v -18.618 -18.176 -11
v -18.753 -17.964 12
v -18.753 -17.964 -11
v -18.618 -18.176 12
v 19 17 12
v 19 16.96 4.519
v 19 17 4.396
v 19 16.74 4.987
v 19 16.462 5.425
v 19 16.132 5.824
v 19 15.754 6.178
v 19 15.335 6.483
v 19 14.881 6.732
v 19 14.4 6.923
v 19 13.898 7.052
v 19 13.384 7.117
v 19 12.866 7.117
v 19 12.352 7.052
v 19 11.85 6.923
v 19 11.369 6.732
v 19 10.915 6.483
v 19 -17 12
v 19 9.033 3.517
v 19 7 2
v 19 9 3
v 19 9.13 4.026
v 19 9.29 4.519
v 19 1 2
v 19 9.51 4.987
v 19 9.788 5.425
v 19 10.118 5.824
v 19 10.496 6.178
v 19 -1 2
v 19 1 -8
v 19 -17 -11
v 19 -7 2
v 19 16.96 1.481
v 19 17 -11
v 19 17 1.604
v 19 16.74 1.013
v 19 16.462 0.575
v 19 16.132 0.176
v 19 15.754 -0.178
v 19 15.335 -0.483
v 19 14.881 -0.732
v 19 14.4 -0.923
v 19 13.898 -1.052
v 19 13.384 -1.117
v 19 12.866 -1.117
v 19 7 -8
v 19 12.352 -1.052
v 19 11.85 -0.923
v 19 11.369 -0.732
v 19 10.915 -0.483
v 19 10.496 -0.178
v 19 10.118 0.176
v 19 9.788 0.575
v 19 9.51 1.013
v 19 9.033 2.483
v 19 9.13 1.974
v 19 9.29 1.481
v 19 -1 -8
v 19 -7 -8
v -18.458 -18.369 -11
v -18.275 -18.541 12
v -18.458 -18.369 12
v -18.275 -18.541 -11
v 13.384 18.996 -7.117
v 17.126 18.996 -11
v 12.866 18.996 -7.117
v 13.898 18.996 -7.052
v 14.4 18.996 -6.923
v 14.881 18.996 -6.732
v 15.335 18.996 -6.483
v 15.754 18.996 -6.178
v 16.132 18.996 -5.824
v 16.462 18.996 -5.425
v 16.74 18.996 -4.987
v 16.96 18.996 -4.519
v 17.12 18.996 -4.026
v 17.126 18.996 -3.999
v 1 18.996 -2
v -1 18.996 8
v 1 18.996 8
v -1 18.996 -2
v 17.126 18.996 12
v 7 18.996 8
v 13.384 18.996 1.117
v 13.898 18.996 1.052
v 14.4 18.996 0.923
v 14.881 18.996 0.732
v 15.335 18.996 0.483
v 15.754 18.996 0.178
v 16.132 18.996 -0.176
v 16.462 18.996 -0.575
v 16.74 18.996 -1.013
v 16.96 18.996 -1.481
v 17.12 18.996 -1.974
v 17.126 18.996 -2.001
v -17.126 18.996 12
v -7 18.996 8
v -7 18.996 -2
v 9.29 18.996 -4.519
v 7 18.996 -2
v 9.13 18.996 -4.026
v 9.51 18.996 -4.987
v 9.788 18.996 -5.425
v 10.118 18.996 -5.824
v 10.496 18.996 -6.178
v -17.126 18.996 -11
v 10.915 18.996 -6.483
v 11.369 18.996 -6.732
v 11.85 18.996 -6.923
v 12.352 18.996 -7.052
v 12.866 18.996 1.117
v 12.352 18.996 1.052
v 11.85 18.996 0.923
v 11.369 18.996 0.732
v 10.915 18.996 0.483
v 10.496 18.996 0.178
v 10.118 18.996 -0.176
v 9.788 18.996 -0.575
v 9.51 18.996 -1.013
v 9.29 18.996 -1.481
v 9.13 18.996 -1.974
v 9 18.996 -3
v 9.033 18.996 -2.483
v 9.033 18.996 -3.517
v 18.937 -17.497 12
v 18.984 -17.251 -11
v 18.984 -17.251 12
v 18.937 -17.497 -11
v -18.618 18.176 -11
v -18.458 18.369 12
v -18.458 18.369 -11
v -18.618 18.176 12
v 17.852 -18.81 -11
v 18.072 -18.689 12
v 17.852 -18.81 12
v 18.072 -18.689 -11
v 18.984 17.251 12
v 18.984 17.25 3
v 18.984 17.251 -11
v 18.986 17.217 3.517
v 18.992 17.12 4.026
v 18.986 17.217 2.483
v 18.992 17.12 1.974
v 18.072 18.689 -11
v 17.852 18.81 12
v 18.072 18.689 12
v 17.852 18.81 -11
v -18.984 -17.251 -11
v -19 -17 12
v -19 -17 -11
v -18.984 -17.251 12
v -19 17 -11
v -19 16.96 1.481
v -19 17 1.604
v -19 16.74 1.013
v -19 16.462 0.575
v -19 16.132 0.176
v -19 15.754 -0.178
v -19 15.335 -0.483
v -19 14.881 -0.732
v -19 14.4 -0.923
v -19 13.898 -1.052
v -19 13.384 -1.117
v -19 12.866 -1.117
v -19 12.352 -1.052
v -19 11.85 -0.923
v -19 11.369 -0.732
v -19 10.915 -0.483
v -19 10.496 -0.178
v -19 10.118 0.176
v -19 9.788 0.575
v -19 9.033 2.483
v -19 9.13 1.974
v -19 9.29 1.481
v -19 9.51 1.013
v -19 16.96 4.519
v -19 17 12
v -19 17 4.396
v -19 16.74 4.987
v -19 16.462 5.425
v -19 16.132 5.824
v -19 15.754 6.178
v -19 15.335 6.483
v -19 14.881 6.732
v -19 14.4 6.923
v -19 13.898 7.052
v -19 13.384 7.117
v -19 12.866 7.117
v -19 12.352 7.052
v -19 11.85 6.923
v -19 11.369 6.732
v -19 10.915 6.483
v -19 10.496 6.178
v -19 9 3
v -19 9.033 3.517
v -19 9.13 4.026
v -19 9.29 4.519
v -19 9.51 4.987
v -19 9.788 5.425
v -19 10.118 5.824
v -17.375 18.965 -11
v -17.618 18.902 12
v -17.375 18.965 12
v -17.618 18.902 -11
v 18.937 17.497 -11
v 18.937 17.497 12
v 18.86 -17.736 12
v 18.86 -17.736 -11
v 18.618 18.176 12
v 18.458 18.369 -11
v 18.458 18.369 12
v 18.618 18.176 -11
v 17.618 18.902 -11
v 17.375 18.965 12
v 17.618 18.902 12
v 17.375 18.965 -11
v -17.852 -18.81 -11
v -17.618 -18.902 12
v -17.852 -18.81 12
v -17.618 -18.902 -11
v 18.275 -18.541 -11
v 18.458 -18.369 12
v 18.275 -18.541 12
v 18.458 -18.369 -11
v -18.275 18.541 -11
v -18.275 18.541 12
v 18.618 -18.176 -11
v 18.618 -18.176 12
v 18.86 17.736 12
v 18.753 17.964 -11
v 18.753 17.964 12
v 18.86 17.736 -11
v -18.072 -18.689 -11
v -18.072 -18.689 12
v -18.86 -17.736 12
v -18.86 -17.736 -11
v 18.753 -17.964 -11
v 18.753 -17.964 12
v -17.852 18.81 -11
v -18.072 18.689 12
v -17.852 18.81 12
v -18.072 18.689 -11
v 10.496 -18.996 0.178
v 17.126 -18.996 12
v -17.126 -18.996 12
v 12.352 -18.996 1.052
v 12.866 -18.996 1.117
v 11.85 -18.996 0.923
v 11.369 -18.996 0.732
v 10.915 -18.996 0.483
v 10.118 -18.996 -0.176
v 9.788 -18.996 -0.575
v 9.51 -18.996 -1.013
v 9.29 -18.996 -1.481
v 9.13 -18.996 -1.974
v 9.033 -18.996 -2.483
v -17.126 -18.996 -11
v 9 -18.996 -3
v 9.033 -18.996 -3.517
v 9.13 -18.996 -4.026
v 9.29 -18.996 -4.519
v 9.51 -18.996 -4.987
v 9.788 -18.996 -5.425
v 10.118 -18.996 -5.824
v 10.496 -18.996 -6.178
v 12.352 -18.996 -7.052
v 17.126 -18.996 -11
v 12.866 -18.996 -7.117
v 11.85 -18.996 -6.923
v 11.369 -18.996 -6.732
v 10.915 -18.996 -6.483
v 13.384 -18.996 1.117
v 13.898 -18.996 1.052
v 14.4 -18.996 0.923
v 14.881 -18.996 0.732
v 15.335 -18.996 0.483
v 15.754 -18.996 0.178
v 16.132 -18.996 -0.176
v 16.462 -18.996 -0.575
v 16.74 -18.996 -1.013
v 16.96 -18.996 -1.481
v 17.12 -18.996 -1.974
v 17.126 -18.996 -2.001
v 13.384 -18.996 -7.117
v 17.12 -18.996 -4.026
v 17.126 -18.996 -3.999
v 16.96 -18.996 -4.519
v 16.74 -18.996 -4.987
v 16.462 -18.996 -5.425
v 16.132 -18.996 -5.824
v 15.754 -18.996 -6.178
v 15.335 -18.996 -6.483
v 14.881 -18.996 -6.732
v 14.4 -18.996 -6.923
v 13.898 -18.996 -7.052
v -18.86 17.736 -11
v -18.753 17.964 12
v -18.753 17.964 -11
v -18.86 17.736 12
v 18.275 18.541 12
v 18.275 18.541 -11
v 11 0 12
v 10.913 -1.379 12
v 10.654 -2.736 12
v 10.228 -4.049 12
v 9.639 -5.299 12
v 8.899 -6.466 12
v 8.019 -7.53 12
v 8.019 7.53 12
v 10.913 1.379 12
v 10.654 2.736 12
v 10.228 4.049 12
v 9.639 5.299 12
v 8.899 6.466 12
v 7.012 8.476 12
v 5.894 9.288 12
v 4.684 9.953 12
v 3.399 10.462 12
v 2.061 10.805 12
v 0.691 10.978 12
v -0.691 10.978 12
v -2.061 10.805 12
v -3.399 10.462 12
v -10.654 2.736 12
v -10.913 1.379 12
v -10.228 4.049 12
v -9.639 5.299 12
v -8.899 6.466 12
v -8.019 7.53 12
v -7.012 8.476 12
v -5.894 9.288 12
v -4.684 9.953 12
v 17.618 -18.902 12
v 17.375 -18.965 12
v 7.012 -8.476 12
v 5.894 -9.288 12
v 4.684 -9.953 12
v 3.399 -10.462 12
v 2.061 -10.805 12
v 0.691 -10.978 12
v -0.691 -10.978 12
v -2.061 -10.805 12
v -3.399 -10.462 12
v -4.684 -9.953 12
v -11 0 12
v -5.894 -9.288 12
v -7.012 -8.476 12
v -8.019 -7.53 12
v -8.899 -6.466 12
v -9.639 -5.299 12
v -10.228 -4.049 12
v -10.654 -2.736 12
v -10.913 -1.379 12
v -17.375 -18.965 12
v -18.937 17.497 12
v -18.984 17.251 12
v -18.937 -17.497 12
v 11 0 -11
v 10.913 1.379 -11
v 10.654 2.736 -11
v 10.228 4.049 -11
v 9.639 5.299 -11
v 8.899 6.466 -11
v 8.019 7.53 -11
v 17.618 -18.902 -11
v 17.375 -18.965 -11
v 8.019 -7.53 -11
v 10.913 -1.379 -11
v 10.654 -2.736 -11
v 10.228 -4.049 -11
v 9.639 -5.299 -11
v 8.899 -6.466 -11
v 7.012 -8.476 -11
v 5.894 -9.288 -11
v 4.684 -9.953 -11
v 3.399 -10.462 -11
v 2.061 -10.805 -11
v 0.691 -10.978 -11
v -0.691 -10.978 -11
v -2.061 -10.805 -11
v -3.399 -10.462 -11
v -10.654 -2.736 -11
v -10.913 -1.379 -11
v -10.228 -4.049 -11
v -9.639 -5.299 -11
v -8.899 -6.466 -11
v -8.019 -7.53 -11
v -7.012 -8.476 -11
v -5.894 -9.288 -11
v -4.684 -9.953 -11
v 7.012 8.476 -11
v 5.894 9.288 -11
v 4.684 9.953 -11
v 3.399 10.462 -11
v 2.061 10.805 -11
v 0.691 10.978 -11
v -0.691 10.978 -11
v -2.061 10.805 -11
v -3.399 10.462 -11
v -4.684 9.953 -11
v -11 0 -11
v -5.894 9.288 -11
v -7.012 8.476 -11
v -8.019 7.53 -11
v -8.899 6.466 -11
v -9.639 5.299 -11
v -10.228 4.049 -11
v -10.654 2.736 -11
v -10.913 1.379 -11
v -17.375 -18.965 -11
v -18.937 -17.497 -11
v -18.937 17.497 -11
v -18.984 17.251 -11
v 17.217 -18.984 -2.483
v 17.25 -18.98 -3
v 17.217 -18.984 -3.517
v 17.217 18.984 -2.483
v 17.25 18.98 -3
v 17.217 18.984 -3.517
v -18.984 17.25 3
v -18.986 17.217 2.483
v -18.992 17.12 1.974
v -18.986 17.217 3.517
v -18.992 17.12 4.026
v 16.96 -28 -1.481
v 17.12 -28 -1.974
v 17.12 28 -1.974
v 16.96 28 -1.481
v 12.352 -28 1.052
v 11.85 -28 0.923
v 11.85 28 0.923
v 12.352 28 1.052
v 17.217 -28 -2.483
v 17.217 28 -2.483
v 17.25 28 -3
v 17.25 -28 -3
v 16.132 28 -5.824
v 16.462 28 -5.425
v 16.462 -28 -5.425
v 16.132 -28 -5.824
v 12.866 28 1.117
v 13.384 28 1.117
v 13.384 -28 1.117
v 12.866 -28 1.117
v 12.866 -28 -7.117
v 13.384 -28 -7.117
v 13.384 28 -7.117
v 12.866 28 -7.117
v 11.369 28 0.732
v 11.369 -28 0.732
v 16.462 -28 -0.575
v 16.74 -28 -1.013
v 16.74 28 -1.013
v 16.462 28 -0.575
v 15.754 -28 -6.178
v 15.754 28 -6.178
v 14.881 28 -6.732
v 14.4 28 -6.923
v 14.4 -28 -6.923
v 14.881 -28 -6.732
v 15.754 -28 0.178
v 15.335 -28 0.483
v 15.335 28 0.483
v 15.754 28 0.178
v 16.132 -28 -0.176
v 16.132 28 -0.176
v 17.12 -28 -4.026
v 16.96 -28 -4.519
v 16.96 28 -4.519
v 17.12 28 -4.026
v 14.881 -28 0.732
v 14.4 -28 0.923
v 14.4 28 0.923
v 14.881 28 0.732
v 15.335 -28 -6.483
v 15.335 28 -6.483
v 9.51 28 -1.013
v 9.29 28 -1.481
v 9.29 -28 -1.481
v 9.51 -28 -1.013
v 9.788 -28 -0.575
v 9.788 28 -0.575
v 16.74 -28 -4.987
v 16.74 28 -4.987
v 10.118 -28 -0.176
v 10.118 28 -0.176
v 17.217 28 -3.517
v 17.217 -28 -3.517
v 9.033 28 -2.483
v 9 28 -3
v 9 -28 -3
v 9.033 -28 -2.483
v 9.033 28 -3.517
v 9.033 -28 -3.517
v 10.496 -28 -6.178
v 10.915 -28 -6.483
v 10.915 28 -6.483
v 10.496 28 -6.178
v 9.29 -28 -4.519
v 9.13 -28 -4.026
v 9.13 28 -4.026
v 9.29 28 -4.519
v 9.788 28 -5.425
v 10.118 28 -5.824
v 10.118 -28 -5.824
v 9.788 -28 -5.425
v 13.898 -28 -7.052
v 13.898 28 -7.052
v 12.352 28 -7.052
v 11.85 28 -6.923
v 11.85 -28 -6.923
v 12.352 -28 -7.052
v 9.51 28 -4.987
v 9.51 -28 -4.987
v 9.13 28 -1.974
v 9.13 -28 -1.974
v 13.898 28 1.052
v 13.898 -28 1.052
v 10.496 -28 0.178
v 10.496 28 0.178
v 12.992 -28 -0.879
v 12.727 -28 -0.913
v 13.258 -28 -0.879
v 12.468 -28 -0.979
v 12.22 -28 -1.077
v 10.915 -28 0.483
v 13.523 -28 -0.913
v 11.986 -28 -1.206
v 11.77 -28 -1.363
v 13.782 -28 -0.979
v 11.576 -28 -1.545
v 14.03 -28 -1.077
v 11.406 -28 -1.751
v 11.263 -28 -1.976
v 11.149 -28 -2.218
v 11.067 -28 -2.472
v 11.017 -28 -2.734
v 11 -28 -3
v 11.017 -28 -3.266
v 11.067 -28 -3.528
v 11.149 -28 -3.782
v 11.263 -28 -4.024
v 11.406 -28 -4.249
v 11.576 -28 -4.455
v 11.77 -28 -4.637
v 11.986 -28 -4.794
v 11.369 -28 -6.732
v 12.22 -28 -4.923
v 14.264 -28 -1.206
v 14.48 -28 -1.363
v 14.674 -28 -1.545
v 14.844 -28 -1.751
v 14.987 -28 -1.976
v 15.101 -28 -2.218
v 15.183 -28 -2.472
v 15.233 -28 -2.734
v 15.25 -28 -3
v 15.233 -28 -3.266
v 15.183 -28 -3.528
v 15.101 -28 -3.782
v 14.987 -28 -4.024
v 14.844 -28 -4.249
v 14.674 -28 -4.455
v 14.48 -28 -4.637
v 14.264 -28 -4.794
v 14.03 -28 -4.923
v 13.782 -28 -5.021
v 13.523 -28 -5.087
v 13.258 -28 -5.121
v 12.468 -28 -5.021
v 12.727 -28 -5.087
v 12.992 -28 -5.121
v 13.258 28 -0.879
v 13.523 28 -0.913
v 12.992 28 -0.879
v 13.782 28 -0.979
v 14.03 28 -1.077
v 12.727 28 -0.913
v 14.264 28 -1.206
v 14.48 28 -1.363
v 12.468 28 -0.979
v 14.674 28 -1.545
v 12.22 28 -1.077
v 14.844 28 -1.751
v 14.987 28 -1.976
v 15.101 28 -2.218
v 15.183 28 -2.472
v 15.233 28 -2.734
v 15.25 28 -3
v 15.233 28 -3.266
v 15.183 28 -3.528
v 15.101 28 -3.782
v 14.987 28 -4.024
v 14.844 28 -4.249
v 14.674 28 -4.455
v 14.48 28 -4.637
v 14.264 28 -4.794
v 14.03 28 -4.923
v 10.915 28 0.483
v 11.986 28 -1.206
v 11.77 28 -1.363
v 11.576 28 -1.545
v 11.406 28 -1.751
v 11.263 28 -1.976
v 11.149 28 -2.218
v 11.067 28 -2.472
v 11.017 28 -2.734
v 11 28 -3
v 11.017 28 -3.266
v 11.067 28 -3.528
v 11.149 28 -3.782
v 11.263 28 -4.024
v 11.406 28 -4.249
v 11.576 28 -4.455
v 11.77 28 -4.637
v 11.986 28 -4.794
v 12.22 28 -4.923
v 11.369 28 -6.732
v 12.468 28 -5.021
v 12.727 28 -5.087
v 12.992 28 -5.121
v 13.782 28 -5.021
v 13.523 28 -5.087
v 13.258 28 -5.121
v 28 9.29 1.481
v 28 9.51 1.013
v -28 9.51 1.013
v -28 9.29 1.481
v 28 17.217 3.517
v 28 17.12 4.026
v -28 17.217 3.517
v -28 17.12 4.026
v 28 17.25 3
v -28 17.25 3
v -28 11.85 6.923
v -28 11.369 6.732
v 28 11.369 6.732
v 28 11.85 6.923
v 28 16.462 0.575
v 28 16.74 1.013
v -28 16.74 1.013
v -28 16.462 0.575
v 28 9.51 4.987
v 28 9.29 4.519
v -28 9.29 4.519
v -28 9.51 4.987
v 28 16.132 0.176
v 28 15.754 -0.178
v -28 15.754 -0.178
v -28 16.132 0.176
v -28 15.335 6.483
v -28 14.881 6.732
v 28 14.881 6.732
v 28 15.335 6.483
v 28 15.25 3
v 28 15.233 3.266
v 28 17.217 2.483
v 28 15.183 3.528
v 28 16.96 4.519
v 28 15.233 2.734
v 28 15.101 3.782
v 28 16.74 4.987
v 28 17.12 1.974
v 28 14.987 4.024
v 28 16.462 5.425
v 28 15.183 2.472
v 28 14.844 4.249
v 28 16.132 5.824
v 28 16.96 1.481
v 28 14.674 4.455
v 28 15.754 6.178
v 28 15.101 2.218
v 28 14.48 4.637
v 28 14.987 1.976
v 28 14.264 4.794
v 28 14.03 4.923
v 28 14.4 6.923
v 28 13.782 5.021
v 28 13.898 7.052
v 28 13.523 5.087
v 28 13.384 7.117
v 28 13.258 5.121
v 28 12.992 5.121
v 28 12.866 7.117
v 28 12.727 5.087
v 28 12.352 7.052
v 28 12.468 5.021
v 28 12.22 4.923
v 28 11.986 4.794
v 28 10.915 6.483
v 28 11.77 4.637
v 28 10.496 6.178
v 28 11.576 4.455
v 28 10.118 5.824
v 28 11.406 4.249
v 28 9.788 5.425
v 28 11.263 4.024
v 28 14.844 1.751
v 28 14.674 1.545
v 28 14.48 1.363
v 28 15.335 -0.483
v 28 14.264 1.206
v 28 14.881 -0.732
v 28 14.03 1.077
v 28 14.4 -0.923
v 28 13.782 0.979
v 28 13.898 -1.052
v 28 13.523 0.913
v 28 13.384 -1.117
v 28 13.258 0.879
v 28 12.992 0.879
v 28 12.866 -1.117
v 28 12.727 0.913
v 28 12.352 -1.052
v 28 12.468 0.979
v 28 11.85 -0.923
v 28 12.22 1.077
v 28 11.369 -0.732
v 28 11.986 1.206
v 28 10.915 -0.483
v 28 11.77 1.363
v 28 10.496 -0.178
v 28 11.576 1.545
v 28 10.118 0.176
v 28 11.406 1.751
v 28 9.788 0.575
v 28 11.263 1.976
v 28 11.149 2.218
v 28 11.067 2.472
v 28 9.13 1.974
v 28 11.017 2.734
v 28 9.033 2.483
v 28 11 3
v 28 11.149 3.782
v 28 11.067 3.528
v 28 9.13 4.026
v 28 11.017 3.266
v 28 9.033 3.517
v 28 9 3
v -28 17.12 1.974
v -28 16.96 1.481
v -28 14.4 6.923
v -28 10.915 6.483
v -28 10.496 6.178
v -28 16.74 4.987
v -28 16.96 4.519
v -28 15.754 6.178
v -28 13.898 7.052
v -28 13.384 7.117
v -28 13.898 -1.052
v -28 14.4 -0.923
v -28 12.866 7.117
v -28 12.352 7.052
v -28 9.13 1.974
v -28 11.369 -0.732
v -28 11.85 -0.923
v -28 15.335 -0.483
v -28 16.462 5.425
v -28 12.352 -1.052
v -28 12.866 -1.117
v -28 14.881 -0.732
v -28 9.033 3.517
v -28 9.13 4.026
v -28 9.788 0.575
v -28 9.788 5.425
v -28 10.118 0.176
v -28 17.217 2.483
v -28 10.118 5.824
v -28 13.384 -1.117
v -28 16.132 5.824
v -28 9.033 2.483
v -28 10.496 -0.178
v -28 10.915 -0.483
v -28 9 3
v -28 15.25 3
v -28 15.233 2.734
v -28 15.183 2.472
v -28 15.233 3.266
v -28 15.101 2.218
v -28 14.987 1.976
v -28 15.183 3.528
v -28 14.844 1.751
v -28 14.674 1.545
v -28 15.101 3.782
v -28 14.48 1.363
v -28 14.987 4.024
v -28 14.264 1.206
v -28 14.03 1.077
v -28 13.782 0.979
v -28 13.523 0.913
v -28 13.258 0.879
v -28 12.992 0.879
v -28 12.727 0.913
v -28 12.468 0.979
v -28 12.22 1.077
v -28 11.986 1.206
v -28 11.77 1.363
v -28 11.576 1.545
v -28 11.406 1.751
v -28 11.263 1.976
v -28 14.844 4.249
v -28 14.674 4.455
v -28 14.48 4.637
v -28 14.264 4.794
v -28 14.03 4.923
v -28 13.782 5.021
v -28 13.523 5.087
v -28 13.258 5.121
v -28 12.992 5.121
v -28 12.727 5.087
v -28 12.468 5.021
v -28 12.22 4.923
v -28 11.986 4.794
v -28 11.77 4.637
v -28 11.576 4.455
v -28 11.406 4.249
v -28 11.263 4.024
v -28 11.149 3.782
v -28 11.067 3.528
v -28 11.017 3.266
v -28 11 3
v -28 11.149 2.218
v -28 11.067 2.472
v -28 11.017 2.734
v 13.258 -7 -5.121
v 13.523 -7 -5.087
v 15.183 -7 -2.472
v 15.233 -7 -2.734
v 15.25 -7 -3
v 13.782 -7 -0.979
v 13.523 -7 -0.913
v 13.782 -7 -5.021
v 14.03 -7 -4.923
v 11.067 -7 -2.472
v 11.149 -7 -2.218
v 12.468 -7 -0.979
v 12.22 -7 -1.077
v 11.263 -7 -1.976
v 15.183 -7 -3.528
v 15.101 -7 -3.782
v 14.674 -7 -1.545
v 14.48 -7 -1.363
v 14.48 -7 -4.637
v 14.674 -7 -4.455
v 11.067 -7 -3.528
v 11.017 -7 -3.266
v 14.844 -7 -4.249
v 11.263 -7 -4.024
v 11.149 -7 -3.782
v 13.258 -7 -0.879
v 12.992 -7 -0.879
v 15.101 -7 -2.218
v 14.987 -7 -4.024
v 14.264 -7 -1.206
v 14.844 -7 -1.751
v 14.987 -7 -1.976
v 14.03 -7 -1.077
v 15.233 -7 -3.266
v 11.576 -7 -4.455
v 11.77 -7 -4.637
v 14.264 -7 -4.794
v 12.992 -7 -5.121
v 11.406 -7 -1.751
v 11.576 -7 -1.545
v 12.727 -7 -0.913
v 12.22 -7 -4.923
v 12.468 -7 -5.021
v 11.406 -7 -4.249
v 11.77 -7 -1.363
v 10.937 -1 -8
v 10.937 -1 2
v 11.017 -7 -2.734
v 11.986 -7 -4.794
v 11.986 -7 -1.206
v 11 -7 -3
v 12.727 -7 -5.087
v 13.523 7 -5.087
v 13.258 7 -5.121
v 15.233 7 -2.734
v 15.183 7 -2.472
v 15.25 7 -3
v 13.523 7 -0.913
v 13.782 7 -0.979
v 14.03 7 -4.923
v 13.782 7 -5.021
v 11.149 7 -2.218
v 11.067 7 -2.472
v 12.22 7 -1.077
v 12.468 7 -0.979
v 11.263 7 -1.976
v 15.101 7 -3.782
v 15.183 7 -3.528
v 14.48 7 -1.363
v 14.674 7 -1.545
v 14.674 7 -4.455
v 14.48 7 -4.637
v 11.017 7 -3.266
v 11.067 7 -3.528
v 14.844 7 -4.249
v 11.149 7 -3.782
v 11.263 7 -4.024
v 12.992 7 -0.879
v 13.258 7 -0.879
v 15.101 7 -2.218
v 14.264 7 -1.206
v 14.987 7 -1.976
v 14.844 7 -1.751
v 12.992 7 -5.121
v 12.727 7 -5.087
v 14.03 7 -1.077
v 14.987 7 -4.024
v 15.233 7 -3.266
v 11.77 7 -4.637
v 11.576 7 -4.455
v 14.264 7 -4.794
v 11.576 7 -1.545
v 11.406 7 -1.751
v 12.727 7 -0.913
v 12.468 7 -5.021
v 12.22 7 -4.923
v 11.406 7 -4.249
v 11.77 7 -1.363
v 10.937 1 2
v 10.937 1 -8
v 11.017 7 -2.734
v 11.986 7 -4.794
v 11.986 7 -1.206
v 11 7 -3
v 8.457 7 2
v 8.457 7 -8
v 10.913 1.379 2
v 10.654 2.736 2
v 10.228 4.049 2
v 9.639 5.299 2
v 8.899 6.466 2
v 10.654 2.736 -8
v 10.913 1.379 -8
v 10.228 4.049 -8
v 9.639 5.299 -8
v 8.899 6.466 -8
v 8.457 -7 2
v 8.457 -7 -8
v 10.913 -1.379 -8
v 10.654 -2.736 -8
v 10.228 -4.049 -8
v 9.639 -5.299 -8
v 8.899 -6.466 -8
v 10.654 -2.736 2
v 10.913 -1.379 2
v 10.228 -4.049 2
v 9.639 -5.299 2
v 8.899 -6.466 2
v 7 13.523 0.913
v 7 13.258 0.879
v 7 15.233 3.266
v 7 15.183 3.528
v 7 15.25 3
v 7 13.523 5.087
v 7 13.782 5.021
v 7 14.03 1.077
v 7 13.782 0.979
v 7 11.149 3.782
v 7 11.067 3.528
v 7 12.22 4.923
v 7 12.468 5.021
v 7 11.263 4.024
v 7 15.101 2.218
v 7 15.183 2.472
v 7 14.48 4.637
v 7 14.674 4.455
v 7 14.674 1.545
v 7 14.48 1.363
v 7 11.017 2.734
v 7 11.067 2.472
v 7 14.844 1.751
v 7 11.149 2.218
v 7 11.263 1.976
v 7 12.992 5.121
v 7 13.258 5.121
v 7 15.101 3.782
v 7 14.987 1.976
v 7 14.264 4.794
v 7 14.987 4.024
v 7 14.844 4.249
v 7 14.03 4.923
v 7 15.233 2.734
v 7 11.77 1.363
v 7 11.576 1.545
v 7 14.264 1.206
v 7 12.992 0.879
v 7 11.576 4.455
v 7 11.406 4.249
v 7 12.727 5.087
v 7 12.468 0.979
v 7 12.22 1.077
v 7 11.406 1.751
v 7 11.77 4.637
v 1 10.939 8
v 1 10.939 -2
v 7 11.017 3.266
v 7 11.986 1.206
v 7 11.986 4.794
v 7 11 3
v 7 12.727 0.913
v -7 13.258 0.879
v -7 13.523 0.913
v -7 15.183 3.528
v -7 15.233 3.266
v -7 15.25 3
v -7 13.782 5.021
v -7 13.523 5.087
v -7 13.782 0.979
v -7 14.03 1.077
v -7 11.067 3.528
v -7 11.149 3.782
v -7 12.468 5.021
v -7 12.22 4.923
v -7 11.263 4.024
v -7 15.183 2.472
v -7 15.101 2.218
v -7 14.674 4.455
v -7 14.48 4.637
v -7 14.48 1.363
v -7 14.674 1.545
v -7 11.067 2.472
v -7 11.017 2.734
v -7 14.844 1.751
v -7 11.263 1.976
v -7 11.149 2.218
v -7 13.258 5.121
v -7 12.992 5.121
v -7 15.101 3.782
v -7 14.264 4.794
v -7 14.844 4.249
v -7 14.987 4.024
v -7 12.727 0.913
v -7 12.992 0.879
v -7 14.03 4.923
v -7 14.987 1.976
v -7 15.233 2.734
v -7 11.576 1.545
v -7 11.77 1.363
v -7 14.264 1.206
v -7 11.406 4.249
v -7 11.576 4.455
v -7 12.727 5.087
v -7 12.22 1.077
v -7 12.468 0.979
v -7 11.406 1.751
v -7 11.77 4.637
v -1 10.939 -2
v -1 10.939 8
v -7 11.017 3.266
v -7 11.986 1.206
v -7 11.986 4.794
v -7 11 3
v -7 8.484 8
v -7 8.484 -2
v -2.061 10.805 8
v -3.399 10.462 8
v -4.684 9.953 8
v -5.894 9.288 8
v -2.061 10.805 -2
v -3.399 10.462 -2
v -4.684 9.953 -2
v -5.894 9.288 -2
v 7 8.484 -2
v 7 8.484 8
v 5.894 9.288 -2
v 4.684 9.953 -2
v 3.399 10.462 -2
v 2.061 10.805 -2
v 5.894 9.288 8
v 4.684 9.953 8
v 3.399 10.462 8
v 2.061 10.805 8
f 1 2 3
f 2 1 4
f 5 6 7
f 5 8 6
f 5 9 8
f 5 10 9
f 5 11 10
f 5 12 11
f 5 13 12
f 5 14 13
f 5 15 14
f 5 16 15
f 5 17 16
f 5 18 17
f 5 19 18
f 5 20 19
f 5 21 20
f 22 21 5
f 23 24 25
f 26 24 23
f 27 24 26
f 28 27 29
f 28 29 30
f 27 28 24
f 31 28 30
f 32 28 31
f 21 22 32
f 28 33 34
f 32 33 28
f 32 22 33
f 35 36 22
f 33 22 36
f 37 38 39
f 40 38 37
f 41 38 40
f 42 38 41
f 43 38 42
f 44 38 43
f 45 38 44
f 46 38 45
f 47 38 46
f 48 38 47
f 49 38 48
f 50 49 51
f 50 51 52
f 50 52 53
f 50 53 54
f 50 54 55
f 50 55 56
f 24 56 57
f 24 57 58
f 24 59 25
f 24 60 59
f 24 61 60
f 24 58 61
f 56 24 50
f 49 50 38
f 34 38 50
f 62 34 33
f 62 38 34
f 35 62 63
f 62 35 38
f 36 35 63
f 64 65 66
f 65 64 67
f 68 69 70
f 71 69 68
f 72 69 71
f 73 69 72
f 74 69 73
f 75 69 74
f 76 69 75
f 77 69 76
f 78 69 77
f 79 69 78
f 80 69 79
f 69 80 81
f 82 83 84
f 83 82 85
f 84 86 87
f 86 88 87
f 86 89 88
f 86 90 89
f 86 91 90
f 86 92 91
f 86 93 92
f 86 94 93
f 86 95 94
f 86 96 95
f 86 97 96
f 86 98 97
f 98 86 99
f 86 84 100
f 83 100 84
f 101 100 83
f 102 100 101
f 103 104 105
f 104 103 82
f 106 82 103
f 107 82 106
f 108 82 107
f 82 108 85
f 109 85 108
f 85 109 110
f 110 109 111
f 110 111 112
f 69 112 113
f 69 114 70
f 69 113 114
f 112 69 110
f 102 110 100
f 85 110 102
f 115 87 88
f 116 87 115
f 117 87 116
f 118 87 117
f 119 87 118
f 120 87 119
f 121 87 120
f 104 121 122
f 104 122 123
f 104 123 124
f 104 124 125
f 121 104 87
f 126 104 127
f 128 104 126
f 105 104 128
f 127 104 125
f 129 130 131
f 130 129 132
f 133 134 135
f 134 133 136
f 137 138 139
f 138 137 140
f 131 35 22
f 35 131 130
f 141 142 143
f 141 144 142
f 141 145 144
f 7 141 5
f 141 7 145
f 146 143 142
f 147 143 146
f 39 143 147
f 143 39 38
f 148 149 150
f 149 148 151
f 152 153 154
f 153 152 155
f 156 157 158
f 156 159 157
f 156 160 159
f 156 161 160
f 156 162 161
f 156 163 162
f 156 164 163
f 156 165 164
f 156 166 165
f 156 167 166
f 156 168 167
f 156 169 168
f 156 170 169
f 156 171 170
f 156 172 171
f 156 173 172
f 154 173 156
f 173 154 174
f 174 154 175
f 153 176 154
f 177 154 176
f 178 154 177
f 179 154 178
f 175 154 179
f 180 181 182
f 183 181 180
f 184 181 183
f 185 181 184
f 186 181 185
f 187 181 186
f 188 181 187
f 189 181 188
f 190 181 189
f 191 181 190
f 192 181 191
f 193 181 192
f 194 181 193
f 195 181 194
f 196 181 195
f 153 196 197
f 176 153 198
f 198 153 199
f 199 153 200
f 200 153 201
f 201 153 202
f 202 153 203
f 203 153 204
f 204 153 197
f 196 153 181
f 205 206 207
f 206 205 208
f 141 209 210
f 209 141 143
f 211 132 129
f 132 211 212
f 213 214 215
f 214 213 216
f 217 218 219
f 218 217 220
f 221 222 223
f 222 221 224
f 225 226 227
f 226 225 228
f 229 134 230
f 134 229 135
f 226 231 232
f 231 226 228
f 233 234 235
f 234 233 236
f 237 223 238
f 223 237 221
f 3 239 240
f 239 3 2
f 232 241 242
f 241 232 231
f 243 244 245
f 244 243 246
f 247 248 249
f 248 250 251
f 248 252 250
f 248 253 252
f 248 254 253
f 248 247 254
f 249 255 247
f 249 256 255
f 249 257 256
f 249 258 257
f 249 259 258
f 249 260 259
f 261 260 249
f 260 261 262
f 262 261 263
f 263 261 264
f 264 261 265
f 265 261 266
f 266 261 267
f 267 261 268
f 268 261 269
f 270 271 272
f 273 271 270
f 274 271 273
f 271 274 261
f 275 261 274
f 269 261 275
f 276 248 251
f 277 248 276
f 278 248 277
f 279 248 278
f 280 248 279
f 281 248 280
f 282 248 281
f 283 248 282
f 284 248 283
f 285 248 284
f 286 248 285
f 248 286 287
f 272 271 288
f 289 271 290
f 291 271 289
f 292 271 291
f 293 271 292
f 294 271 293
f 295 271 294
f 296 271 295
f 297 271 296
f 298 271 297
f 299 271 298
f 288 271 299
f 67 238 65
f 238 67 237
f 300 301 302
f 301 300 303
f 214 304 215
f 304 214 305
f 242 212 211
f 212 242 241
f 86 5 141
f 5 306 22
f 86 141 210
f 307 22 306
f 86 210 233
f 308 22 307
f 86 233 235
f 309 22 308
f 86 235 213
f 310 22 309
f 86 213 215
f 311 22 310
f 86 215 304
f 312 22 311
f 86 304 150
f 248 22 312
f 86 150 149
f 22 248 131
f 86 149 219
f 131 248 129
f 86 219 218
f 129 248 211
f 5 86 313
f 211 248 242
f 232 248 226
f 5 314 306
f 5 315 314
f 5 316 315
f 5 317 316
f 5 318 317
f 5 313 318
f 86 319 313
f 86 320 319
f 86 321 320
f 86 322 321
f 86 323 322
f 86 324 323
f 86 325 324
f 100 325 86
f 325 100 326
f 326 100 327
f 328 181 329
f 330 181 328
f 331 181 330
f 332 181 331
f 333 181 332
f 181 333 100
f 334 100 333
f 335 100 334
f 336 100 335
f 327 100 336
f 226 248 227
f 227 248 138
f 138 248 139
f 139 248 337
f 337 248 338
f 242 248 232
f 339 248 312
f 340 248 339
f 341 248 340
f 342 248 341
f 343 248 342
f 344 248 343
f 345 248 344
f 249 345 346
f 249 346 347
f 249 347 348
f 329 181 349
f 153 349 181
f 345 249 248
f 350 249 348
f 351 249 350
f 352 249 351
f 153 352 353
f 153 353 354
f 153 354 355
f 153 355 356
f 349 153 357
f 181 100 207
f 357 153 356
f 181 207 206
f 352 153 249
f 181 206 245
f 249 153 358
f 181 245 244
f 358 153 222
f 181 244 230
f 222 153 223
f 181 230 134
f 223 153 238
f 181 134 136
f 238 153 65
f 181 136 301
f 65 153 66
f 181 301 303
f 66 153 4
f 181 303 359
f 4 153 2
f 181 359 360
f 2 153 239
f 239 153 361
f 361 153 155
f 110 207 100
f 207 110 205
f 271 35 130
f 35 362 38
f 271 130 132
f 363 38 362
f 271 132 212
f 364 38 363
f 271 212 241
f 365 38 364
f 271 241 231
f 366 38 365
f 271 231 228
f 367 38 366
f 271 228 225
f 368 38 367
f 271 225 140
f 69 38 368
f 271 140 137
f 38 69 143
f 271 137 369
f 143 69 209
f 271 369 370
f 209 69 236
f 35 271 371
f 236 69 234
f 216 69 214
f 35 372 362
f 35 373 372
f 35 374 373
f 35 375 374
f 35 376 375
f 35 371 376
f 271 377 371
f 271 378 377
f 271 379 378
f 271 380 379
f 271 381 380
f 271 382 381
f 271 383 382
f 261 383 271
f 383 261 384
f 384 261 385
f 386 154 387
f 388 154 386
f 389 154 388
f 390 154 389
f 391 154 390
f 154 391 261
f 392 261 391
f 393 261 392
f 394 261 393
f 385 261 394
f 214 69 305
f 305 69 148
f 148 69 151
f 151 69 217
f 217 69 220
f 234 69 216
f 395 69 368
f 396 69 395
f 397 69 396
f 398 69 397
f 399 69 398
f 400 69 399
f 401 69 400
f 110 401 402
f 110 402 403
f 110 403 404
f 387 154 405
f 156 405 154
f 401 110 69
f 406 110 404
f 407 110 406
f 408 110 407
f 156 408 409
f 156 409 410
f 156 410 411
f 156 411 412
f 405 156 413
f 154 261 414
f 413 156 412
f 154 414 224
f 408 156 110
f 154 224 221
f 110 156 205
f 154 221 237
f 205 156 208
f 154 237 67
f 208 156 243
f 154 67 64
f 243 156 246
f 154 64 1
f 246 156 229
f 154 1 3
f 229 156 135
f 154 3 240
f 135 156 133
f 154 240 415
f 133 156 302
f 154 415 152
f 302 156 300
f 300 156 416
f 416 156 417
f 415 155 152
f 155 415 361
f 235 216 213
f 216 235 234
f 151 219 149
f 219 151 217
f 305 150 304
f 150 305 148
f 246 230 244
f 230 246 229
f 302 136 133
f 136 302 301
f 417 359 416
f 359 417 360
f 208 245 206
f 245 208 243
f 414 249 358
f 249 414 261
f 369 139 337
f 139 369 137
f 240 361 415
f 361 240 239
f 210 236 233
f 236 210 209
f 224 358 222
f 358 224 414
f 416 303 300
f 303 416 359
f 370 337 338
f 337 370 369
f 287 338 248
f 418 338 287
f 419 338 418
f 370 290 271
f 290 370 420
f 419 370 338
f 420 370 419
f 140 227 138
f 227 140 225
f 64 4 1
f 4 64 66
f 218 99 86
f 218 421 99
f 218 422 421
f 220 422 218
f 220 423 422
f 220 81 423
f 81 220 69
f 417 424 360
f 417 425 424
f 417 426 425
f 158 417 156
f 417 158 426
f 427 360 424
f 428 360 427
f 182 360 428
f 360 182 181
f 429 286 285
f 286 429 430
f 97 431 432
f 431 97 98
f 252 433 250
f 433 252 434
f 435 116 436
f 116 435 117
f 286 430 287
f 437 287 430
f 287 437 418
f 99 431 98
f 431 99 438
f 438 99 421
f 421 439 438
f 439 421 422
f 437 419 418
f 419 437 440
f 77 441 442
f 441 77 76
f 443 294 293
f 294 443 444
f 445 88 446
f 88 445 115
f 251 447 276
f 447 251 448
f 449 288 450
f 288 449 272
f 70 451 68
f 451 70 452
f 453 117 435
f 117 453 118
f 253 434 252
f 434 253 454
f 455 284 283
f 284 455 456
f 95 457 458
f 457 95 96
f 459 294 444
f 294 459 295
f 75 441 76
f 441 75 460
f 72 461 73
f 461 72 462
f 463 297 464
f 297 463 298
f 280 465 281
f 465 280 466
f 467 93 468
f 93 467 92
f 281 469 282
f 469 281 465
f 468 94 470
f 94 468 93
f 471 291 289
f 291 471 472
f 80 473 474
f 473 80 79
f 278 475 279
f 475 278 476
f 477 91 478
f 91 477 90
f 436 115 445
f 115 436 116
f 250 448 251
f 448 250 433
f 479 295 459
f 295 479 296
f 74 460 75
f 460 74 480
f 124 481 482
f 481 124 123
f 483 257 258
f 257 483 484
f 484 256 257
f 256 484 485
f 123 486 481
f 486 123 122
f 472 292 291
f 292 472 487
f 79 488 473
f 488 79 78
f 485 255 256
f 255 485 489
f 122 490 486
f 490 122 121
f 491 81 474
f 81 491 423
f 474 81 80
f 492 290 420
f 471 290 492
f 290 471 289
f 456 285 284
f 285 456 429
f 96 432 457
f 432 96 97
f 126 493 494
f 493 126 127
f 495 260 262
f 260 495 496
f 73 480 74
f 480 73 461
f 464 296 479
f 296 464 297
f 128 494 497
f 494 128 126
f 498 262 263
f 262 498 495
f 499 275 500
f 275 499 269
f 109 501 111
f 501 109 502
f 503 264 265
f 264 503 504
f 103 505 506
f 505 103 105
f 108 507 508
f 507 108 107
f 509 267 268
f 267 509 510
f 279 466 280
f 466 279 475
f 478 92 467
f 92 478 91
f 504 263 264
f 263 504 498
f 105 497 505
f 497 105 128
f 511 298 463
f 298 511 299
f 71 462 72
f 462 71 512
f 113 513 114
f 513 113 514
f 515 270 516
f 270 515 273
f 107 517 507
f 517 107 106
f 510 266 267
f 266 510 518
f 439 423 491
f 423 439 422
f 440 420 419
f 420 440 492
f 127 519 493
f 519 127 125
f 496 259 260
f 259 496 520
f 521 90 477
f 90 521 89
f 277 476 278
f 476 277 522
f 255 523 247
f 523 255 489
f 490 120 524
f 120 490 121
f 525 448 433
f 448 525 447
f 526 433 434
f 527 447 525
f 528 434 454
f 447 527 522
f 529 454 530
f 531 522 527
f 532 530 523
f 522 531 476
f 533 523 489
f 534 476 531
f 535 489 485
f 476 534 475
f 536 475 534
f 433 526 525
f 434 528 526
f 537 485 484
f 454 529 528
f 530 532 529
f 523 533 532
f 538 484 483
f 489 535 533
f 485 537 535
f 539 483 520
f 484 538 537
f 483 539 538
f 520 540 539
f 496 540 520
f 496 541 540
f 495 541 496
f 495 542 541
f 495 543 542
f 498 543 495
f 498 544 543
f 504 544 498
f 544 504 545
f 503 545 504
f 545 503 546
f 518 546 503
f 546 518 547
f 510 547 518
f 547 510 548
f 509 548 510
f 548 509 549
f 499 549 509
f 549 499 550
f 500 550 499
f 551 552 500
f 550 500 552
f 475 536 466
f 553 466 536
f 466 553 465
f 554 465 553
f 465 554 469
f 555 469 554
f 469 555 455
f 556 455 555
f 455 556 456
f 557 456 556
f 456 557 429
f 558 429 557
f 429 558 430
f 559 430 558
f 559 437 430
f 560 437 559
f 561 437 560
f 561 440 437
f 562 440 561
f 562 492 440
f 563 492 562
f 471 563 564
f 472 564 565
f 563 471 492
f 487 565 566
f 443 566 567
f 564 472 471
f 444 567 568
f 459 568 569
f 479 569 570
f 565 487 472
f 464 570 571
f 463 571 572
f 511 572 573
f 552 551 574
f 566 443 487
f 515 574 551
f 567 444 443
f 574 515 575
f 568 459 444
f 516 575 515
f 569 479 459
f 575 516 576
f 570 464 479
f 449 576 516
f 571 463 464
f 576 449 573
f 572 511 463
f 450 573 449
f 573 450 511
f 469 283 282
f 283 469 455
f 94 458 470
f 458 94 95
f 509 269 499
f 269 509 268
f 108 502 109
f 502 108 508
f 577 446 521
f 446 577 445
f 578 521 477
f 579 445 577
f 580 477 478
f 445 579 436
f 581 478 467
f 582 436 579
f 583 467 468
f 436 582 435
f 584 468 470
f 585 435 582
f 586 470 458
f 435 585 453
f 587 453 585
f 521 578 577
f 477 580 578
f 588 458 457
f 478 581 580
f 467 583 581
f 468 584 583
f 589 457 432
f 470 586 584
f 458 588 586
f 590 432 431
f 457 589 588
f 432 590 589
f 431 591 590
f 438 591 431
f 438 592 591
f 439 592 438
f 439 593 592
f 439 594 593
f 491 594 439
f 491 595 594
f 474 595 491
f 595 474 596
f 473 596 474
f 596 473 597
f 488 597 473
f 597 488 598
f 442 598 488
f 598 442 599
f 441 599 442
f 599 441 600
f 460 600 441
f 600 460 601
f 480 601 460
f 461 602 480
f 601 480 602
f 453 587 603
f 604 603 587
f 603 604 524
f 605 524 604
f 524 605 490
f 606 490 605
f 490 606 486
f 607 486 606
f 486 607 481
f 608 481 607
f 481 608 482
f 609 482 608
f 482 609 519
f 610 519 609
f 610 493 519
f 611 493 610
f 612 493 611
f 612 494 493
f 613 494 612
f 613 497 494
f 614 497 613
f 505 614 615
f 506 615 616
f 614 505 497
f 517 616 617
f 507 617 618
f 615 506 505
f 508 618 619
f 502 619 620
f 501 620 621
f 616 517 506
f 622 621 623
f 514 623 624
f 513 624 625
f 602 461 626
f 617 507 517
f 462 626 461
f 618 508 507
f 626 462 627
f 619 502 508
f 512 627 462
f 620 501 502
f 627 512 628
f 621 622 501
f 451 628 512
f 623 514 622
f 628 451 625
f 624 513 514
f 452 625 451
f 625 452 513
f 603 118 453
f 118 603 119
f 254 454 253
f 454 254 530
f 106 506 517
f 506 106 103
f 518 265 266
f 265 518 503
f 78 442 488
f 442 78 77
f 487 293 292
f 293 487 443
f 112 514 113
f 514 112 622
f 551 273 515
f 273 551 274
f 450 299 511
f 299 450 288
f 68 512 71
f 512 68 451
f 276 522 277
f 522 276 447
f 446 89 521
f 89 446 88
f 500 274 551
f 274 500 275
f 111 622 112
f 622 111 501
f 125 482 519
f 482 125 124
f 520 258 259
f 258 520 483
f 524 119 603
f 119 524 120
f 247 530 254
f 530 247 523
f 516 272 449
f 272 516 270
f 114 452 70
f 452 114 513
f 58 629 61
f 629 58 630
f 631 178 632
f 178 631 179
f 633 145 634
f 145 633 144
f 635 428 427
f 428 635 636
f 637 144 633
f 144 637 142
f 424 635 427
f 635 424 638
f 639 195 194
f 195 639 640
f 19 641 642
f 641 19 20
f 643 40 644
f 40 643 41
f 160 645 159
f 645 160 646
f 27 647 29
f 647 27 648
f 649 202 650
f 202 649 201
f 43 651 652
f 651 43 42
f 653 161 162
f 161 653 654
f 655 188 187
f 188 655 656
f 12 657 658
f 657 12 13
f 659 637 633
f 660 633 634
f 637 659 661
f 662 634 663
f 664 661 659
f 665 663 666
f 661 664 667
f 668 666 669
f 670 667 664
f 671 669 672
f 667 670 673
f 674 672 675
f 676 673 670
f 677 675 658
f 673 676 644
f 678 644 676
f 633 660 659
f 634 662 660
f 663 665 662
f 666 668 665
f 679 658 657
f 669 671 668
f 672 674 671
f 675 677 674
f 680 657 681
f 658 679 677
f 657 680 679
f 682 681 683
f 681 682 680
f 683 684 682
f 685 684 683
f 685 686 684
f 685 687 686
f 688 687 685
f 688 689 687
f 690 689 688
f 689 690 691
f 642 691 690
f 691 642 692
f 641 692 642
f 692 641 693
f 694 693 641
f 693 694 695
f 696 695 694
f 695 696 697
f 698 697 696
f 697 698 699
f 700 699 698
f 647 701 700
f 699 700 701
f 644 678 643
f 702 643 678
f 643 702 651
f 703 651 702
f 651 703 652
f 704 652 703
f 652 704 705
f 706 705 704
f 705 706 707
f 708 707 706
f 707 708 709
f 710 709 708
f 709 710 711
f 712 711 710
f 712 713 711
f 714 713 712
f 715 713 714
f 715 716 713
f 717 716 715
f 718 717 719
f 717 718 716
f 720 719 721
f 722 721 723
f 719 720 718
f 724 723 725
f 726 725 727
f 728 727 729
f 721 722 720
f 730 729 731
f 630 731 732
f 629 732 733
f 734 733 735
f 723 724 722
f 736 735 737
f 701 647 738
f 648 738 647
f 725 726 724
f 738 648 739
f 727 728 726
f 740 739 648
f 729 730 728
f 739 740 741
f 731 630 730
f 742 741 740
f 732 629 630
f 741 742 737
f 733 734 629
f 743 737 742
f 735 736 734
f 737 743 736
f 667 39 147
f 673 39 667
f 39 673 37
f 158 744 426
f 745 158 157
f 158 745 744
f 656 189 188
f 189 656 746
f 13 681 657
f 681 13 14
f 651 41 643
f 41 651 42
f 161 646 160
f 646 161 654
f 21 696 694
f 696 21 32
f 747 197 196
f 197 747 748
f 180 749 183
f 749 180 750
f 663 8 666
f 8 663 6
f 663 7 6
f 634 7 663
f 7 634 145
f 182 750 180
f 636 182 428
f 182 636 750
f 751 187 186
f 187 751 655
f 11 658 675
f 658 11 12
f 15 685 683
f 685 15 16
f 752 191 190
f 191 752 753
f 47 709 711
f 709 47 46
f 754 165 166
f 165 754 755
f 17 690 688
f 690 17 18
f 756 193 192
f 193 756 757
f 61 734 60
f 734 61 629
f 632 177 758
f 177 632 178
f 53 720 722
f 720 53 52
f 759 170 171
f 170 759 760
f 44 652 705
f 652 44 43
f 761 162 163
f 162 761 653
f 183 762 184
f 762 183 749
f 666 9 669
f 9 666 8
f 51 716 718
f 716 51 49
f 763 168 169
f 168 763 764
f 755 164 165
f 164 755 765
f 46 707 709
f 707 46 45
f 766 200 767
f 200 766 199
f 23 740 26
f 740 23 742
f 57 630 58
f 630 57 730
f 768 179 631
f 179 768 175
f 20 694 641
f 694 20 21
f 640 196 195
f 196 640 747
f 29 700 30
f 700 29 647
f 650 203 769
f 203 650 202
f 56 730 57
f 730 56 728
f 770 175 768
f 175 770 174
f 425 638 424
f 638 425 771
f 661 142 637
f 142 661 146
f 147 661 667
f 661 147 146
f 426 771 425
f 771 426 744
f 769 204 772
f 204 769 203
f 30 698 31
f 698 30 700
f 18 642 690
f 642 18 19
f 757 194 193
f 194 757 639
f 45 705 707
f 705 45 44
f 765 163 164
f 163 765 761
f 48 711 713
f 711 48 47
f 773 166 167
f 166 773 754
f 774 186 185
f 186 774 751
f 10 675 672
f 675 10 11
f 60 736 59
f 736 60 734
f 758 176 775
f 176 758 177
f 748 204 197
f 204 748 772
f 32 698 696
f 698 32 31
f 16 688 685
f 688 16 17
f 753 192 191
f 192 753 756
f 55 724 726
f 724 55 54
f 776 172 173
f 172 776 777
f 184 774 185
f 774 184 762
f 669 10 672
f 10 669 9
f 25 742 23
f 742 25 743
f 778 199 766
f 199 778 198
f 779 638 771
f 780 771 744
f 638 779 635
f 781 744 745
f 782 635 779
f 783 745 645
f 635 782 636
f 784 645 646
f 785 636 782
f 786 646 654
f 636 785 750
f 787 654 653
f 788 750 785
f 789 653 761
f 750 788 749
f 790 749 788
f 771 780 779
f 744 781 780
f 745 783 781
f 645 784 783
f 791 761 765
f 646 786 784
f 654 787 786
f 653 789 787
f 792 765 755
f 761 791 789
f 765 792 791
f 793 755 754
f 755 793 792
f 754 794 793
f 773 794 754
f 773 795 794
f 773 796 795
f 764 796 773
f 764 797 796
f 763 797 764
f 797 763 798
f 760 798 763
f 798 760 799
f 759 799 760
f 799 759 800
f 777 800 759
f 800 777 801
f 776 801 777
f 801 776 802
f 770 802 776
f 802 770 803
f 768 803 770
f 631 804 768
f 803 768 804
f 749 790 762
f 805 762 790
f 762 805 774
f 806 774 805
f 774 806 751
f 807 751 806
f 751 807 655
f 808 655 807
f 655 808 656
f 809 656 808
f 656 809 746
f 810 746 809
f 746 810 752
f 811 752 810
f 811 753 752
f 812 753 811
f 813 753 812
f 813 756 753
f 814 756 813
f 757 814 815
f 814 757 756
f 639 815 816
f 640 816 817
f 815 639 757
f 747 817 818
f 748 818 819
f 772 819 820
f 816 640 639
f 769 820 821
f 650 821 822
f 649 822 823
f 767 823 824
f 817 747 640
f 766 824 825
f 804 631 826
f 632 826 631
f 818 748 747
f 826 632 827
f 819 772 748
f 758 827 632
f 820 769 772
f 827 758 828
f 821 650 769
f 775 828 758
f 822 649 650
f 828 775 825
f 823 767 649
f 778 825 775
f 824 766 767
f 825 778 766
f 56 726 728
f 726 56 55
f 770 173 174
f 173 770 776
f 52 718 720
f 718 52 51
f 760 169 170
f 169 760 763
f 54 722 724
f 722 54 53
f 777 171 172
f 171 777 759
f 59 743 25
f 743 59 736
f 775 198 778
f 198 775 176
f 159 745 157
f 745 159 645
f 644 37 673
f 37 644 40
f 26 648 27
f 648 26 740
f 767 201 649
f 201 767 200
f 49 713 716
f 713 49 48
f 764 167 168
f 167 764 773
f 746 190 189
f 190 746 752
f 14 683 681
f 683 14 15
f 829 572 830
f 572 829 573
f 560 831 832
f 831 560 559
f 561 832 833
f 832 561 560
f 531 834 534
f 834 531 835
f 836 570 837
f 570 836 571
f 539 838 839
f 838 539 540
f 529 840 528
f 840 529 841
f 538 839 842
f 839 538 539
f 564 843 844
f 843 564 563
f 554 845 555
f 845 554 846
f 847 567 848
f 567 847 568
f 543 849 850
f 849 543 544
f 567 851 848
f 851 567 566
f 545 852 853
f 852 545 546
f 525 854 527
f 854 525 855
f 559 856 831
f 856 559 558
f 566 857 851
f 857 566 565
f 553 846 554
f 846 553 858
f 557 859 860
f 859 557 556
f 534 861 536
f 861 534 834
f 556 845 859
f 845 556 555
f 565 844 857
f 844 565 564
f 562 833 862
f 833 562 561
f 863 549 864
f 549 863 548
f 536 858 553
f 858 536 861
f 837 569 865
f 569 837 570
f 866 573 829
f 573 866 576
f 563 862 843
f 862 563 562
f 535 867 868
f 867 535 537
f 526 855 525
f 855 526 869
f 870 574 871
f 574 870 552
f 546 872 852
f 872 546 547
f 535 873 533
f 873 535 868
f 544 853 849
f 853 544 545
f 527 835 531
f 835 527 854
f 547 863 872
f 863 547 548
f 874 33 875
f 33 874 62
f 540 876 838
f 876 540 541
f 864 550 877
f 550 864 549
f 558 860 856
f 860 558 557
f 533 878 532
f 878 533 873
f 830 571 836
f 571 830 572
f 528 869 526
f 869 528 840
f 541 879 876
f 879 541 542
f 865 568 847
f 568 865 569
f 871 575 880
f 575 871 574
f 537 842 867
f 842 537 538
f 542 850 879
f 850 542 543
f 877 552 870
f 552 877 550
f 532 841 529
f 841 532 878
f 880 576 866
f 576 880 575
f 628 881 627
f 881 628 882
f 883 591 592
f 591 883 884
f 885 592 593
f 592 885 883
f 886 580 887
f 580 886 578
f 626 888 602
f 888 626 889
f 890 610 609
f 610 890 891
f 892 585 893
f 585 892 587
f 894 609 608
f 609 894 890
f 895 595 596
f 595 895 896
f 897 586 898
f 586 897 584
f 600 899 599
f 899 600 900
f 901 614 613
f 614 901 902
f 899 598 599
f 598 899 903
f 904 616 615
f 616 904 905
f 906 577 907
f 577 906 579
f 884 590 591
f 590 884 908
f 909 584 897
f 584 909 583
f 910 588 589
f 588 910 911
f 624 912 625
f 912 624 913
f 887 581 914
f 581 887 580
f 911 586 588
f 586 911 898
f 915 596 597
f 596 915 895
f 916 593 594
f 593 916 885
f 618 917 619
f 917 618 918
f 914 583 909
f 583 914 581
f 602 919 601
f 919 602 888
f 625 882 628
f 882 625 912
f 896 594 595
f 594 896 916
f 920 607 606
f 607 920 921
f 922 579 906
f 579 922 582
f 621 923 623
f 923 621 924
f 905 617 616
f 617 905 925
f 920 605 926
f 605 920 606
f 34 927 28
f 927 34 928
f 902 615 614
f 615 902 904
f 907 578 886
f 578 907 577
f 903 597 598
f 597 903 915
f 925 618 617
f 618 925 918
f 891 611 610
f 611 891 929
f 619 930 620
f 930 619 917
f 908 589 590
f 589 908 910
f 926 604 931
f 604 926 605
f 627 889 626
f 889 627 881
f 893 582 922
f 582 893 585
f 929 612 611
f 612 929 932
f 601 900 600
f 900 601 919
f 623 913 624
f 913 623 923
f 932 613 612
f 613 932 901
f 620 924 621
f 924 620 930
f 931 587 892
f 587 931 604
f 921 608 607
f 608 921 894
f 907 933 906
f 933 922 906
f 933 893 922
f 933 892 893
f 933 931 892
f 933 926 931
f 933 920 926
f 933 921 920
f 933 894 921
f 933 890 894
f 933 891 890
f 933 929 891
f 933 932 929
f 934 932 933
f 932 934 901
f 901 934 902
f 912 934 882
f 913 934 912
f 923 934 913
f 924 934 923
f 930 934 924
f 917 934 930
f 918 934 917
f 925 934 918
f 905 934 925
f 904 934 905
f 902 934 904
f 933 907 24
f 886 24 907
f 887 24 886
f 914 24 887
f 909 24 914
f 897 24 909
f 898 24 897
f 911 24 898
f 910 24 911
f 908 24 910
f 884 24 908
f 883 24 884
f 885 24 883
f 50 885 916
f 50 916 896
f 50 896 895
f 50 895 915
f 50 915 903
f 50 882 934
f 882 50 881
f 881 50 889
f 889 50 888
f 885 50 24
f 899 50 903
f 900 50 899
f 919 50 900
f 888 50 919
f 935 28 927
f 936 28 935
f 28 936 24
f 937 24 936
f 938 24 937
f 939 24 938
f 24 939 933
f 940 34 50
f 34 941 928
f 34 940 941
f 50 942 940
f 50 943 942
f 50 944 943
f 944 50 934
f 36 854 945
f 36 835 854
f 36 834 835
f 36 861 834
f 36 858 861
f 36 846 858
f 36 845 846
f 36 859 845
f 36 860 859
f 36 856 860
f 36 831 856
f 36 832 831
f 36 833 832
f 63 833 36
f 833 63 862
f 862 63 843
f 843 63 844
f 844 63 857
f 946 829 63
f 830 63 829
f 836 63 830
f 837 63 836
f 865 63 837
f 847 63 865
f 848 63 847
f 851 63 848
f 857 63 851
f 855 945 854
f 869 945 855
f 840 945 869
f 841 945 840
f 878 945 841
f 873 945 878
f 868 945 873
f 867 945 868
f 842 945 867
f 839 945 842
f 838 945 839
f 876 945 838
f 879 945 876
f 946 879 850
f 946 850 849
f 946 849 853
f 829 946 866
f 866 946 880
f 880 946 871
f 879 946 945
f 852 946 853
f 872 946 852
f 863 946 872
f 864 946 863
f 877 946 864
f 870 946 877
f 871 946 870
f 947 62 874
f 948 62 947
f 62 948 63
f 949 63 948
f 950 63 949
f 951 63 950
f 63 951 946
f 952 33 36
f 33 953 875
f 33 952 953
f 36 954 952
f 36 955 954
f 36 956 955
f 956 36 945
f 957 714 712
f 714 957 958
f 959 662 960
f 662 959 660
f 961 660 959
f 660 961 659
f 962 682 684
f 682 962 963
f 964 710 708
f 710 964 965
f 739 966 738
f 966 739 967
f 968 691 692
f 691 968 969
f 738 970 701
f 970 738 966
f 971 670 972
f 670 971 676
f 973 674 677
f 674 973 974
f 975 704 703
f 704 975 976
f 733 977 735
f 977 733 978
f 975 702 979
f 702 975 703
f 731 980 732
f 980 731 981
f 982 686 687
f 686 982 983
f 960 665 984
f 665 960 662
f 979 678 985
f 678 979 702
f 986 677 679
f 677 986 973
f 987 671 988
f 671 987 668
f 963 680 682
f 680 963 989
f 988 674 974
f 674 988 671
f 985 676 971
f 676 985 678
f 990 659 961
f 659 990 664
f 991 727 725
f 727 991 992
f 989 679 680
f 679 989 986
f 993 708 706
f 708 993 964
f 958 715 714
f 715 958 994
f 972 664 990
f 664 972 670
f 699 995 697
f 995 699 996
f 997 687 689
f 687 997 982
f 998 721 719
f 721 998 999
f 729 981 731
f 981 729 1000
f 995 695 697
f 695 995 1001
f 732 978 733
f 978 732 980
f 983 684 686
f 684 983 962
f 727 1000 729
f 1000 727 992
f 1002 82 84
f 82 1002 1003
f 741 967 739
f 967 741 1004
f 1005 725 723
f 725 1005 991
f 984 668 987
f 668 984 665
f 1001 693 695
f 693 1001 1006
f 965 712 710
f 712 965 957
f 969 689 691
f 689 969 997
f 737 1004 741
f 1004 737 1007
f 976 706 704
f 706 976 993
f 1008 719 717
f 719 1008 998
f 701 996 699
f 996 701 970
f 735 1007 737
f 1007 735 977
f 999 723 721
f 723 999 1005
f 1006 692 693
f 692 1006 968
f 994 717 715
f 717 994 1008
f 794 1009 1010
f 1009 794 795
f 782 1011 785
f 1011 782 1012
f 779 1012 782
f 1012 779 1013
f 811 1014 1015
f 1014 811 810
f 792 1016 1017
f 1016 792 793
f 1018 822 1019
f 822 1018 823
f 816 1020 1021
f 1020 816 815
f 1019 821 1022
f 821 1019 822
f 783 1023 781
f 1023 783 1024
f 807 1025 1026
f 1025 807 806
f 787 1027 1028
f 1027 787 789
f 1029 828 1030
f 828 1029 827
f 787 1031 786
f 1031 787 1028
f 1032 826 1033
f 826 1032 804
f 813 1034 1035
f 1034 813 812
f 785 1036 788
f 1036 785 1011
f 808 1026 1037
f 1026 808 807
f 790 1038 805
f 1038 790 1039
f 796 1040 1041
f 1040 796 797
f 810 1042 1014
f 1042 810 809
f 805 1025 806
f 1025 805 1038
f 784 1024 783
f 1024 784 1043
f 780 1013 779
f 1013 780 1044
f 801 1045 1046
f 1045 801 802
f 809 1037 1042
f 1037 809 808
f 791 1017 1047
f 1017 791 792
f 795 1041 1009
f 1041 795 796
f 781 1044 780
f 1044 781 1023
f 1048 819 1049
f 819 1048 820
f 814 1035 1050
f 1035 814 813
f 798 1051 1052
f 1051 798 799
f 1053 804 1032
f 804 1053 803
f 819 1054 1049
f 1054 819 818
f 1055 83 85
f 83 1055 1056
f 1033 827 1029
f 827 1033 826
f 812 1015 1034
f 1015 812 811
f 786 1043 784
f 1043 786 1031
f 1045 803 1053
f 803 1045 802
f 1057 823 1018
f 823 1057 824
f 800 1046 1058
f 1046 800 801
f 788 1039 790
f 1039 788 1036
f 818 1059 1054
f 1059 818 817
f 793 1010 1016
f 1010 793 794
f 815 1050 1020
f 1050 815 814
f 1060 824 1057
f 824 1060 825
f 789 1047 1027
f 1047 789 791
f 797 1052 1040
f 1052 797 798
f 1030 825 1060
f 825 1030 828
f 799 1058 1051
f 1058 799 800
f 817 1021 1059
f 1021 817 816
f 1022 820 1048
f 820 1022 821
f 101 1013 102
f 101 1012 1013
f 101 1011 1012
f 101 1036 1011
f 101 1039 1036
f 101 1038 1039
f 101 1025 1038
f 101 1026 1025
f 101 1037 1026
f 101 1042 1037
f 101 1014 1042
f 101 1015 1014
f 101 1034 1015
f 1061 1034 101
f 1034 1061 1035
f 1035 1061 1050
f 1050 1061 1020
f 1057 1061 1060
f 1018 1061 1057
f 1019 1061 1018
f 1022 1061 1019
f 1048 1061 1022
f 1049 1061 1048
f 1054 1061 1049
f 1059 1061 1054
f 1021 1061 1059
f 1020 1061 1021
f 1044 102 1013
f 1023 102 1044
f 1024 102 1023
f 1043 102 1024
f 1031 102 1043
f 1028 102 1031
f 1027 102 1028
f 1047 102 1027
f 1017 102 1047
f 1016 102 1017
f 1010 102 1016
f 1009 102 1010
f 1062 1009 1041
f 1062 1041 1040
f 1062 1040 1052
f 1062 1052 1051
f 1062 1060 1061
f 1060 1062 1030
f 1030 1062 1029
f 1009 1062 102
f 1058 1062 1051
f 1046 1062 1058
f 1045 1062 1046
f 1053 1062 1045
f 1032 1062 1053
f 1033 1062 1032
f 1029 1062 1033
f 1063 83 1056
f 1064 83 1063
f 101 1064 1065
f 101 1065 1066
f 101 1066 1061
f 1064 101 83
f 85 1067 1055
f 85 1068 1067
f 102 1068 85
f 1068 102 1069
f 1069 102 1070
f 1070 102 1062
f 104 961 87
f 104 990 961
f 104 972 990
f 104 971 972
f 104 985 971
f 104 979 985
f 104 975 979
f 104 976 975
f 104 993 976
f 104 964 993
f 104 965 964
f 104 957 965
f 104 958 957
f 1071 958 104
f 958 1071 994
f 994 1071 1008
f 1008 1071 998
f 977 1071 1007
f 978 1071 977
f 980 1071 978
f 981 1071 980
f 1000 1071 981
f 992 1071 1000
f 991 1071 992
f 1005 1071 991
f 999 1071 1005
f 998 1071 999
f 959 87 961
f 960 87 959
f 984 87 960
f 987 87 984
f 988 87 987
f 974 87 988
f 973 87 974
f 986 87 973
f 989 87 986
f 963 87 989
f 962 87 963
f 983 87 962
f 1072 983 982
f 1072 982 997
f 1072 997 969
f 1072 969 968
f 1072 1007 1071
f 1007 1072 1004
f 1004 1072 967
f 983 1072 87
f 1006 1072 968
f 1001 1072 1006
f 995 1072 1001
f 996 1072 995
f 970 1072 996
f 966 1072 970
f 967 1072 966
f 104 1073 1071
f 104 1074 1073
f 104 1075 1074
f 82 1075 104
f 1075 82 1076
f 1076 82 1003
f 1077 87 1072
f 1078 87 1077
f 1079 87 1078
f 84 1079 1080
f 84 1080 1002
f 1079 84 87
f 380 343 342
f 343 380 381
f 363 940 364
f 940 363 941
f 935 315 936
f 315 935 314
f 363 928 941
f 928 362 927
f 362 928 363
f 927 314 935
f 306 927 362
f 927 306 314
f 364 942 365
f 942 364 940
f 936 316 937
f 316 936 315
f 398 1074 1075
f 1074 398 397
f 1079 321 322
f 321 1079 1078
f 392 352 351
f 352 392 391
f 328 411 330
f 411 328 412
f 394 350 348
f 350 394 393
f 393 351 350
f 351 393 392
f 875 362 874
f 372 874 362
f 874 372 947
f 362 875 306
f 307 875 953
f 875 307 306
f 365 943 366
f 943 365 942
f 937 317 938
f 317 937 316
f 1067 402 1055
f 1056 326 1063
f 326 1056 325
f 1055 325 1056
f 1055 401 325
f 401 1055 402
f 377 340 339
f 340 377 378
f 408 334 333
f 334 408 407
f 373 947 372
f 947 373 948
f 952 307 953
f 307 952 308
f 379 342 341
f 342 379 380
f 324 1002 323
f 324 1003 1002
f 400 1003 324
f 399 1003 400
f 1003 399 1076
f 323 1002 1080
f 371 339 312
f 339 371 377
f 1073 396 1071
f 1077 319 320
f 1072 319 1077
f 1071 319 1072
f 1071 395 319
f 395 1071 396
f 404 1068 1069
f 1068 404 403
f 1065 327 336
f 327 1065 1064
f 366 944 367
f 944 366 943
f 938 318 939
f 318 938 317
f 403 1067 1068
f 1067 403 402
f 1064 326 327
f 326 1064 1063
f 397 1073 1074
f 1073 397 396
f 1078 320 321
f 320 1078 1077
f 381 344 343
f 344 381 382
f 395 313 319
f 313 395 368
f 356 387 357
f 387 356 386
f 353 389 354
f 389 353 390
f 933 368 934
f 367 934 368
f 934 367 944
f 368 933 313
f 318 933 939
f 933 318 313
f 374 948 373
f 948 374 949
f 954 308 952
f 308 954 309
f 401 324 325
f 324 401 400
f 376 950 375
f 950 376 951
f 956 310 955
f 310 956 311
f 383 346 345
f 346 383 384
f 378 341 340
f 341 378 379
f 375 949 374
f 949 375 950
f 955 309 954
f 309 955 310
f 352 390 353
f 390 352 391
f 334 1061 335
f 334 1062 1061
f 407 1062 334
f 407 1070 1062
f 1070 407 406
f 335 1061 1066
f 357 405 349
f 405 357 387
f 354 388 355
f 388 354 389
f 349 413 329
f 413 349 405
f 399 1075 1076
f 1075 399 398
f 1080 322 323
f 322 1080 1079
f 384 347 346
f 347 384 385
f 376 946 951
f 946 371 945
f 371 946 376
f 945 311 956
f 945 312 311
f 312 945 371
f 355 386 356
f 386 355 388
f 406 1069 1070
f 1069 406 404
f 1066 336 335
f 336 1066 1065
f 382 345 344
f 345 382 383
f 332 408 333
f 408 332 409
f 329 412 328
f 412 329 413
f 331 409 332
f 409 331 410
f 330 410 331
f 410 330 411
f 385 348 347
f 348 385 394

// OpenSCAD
//Radiator Holder for cross-yagi
//Reinforced element holder with space for soldering coax
//SatNOGS project
//cshields edits, based on
//https://github.com/satnogs/satnogs-hardware/blob/master/Antennas/Yagi/Cross-Yagi-UHF-v1/src/satnogs-radiator-holder.scad

width = 38;
mast = 22;
element = 4.25;
extension = 9; // how far to extend the element supports

$fn=50;

module element_gutter() {
	union() {
		translate([mast/2+element/2,0,width/2+extension/2+1])
			cylinder(d=element,h=width+extension,center=true);
		translate([mast/2+element/2,0,-(width/2+extension/2+6)])
			cylinder(d=element,h=width+extension*2+1,center=true);
		rotate(90,[0,1,0])
			translate([4,0,mast/2])
			cube([6,10,mast],center=true);
		rotate(90,[0,1,0])
			translate ([-4,0,mast/2])
			cube([6,10,mast],center=true);
	}
}

module element_extension() {
	cylinder(d=element+4,h=width+extension*2,center=true);
}

module holder() {
	difference() {
		union() {
			minkowski() {
				cube([width-4,width-4,22], center=true);
				cylinder(r=2,h=1);
			}
			translate([mast/2+element/2,0,-3])
				rotate(90,[1,0,0])
					element_extension();
			rotate(90,[0,0,1])
				translate([mast/2+element/2,0,3])
					rotate(90,[1,0,0])
						element_extension();

		}
		cylinder(d=mast,h=width,center=true);
		translate([0,0,-3])
			rotate(90,[1,0,0])
				element_gutter();
		rotate(90,[0,0,1])
			translate([0,0,3])
				rotate(90,[1,0,0])
					element_gutter();
	}
}
	

holder();
